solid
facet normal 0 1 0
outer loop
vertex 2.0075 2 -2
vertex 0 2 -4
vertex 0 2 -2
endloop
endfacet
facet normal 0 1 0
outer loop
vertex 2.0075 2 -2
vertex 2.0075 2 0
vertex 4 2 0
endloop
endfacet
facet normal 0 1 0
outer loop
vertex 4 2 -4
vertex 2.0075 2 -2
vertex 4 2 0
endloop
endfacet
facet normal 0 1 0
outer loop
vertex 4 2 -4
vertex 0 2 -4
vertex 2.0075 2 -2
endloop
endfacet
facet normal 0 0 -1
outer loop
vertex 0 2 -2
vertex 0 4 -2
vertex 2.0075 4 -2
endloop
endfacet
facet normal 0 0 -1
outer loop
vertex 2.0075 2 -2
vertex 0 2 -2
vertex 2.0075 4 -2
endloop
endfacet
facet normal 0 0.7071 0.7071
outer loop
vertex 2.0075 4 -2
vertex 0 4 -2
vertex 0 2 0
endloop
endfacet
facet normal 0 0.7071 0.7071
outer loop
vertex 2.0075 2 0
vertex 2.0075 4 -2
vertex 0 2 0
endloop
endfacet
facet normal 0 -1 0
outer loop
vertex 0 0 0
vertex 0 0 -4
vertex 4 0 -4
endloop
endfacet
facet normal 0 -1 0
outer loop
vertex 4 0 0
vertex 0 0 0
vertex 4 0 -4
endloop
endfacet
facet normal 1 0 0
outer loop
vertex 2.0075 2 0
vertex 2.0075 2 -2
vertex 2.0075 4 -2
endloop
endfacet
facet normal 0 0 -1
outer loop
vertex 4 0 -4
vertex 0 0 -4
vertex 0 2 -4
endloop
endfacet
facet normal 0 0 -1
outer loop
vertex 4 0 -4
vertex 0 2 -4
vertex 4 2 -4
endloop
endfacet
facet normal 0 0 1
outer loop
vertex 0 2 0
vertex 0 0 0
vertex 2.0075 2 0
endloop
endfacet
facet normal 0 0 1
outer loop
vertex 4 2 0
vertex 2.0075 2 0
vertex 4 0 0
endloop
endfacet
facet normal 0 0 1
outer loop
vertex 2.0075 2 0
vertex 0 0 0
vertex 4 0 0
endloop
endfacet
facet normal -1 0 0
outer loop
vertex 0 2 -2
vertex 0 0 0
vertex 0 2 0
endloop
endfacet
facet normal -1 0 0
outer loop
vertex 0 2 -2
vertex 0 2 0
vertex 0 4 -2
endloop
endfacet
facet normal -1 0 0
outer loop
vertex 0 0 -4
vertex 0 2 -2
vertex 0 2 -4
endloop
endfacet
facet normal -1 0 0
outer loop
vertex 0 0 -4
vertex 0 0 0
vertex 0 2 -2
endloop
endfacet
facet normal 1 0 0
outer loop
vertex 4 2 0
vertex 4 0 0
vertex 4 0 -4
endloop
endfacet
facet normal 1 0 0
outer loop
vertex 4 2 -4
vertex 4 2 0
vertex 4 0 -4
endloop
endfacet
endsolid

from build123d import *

# Parameters (mm, degrees)
SKETCH1_W           = 4
SKETCH1_H           = 4
BOSS_EXTRUDE1_DEPTH = 4
CUT_EXTRUDE1_DEPTH  = 2
CUT_EXTRUDE2_DEPTH  = 10


with BuildPart() as part:
    # Sketch1 → Boss-Extrude1 (new body)
    with BuildSketch(Plane(origin=(0, 0, 0), x_dir=(1, 0, 0), z_dir=(0, 1, 0))):
        with Locations((2, 2)):
            Rectangle(SKETCH1_W, SKETCH1_H)
    extrude(amount=BOSS_EXTRUDE1_DEPTH)

    # Sketch2 → Cut-Extrude1 (cut)
    with BuildSketch(Plane(origin=(0, 4, 0), x_dir=(1, 0, 0), z_dir=(0, 1, 0))):
        Polygon((0, 4), (0, 2), (2.007512108, 2), (2.007512108, 0), (4, 0), (4, 4), align=None)
    extrude(amount=-CUT_EXTRUDE1_DEPTH, mode=Mode.SUBTRACT)

    # Sketch3 → Cut-Extrude2 (cut)
    with BuildSketch(Plane.ZY):
        Polygon((0, 4), (-2, 4), (0, 2), align=None)
    extrude(amount=-CUT_EXTRUDE2_DEPTH, mode=Mode.SUBTRACT)


solid = part.part
